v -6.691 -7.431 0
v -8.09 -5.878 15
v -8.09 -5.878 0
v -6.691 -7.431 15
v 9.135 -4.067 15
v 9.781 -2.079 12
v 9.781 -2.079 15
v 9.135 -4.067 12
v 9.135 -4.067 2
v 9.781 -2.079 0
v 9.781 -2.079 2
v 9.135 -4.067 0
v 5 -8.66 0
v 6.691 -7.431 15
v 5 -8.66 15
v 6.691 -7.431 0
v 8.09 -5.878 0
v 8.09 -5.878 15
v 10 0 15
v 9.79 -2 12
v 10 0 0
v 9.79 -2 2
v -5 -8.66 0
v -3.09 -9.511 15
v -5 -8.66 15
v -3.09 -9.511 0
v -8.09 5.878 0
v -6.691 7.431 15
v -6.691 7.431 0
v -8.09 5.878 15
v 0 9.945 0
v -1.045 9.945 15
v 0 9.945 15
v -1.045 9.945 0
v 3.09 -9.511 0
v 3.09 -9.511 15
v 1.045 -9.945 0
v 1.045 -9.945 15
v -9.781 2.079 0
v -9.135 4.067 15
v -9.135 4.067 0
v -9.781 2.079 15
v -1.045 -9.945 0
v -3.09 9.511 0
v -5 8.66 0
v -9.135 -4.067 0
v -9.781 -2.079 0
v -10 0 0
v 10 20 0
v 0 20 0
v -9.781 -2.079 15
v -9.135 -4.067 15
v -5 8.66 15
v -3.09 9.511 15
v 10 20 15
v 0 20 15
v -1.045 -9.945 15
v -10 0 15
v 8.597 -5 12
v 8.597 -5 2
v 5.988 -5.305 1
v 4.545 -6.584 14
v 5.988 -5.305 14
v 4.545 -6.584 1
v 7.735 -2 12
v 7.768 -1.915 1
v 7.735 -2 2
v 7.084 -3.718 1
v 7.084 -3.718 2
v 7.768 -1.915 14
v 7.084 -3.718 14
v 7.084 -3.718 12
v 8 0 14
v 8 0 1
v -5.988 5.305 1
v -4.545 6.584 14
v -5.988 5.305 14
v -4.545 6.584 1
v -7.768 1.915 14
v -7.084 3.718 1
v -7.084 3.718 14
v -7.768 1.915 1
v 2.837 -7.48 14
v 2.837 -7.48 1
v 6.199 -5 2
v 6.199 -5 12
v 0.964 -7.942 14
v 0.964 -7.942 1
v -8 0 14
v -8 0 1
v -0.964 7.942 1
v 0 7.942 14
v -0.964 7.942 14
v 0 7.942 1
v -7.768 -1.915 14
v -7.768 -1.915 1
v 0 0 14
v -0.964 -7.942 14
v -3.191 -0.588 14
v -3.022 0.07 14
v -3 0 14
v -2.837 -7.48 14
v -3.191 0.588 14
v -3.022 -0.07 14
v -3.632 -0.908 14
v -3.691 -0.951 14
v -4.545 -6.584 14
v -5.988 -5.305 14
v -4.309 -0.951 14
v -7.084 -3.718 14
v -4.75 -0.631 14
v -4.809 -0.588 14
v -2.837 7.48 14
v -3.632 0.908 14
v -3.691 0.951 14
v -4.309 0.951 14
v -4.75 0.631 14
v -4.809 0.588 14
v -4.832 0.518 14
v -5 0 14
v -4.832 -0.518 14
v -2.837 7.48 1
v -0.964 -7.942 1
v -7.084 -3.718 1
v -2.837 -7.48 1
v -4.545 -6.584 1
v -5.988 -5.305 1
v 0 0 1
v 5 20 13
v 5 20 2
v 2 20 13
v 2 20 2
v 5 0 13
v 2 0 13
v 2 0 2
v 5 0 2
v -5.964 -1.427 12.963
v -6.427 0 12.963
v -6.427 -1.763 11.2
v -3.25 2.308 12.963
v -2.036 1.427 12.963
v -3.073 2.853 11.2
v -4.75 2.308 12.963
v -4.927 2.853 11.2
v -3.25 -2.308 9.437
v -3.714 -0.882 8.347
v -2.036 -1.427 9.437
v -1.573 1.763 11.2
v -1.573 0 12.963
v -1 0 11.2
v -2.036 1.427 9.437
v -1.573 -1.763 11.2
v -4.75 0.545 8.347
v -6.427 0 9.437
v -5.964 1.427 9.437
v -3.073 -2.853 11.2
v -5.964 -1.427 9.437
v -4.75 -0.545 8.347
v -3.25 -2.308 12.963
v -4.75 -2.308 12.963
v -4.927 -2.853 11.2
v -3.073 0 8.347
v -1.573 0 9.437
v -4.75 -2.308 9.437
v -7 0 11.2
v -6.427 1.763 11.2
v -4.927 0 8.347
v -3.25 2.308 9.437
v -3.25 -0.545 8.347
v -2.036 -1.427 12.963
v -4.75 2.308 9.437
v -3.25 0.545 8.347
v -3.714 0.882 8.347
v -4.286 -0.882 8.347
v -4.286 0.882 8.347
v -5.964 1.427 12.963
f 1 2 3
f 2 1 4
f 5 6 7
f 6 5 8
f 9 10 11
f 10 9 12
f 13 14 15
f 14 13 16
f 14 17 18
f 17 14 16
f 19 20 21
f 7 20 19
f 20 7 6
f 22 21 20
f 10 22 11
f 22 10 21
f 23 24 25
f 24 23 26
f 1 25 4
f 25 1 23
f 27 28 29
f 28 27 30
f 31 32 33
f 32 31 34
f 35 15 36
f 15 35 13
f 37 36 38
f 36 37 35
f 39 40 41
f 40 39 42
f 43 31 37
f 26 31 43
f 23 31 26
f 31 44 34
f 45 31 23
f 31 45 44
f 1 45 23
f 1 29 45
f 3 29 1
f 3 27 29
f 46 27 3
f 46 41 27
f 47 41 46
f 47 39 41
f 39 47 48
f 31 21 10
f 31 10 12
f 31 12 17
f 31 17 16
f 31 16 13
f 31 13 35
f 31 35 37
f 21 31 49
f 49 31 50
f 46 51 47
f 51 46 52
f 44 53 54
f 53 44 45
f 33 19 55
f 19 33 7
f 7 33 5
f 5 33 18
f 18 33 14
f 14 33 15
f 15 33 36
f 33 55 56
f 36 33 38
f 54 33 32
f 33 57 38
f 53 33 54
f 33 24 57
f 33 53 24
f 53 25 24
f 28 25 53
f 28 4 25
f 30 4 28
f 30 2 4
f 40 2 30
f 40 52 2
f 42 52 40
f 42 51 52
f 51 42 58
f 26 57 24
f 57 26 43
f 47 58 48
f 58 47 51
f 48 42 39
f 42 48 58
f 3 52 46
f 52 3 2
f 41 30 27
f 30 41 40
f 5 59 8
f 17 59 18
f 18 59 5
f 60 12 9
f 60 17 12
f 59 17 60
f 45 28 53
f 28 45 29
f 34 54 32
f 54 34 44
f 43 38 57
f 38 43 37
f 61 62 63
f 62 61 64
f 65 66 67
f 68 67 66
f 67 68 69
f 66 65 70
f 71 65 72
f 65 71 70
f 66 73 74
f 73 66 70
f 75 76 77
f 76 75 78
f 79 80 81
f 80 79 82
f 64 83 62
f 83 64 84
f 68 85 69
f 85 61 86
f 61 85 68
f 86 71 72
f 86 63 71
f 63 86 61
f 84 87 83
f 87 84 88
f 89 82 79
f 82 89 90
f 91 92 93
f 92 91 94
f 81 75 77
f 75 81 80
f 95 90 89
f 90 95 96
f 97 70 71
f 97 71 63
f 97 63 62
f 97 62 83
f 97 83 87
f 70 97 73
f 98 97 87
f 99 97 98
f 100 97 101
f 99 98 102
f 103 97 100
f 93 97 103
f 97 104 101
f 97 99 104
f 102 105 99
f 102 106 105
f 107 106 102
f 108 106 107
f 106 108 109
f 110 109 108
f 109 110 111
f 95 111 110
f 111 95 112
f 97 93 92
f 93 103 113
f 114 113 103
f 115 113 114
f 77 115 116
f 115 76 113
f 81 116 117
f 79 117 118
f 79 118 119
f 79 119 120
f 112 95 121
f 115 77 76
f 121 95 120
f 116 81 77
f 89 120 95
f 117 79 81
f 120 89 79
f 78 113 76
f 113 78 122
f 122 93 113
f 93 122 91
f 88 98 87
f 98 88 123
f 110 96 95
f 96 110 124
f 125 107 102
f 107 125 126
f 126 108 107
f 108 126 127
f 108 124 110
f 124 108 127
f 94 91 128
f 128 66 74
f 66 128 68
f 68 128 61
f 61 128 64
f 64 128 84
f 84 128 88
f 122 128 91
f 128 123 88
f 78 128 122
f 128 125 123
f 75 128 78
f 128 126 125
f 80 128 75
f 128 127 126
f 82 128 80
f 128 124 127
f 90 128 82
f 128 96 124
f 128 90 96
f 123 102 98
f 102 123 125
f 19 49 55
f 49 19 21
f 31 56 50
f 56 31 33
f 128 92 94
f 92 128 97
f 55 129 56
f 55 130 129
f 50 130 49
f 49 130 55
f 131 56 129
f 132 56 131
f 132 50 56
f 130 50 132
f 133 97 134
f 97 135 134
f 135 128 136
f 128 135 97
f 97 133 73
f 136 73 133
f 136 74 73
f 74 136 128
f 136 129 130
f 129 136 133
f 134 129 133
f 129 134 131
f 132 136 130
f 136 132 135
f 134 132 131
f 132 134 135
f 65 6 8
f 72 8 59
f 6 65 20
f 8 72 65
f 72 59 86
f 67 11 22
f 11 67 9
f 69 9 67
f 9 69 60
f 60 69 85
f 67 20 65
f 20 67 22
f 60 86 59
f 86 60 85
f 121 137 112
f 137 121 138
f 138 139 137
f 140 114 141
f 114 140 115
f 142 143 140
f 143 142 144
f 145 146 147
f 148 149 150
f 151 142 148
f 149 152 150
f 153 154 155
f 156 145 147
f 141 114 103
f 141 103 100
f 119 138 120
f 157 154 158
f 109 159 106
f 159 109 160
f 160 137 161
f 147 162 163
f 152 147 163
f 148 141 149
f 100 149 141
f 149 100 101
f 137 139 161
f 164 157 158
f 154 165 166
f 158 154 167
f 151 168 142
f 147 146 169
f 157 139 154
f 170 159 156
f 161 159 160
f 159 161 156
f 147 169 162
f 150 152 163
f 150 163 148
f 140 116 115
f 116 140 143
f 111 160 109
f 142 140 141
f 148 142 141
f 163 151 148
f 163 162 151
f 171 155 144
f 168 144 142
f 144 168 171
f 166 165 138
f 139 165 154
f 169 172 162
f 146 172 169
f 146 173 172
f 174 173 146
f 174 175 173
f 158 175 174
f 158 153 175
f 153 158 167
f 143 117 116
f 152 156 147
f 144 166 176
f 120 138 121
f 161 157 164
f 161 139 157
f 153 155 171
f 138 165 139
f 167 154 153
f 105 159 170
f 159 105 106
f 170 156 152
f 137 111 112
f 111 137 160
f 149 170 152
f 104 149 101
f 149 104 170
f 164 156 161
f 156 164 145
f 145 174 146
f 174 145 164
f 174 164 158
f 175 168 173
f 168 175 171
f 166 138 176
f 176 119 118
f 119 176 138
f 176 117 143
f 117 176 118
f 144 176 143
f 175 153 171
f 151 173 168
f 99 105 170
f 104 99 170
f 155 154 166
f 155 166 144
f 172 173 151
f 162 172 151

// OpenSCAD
difference() {
	
	union() {
		difference() {
			difference() {
				union() {
					difference() {
						cylinder(r=10,h=15);
						translate([0,0,1])
						cylinder(r=8,h=15-2);
					}
					cube([10,20,15]);
				}
			
				translate([2,-3,2])
				cube([10-7,35,15-4]);
			}

			translate([0,-5,2])
			cube( [ 10,3,10 ] );
		}	
		
		translate([-4,0,11.2])
		sphere(r=3);
	}	
	*translate([-20,-20,-20])
	cube([30,60,30]);
}
